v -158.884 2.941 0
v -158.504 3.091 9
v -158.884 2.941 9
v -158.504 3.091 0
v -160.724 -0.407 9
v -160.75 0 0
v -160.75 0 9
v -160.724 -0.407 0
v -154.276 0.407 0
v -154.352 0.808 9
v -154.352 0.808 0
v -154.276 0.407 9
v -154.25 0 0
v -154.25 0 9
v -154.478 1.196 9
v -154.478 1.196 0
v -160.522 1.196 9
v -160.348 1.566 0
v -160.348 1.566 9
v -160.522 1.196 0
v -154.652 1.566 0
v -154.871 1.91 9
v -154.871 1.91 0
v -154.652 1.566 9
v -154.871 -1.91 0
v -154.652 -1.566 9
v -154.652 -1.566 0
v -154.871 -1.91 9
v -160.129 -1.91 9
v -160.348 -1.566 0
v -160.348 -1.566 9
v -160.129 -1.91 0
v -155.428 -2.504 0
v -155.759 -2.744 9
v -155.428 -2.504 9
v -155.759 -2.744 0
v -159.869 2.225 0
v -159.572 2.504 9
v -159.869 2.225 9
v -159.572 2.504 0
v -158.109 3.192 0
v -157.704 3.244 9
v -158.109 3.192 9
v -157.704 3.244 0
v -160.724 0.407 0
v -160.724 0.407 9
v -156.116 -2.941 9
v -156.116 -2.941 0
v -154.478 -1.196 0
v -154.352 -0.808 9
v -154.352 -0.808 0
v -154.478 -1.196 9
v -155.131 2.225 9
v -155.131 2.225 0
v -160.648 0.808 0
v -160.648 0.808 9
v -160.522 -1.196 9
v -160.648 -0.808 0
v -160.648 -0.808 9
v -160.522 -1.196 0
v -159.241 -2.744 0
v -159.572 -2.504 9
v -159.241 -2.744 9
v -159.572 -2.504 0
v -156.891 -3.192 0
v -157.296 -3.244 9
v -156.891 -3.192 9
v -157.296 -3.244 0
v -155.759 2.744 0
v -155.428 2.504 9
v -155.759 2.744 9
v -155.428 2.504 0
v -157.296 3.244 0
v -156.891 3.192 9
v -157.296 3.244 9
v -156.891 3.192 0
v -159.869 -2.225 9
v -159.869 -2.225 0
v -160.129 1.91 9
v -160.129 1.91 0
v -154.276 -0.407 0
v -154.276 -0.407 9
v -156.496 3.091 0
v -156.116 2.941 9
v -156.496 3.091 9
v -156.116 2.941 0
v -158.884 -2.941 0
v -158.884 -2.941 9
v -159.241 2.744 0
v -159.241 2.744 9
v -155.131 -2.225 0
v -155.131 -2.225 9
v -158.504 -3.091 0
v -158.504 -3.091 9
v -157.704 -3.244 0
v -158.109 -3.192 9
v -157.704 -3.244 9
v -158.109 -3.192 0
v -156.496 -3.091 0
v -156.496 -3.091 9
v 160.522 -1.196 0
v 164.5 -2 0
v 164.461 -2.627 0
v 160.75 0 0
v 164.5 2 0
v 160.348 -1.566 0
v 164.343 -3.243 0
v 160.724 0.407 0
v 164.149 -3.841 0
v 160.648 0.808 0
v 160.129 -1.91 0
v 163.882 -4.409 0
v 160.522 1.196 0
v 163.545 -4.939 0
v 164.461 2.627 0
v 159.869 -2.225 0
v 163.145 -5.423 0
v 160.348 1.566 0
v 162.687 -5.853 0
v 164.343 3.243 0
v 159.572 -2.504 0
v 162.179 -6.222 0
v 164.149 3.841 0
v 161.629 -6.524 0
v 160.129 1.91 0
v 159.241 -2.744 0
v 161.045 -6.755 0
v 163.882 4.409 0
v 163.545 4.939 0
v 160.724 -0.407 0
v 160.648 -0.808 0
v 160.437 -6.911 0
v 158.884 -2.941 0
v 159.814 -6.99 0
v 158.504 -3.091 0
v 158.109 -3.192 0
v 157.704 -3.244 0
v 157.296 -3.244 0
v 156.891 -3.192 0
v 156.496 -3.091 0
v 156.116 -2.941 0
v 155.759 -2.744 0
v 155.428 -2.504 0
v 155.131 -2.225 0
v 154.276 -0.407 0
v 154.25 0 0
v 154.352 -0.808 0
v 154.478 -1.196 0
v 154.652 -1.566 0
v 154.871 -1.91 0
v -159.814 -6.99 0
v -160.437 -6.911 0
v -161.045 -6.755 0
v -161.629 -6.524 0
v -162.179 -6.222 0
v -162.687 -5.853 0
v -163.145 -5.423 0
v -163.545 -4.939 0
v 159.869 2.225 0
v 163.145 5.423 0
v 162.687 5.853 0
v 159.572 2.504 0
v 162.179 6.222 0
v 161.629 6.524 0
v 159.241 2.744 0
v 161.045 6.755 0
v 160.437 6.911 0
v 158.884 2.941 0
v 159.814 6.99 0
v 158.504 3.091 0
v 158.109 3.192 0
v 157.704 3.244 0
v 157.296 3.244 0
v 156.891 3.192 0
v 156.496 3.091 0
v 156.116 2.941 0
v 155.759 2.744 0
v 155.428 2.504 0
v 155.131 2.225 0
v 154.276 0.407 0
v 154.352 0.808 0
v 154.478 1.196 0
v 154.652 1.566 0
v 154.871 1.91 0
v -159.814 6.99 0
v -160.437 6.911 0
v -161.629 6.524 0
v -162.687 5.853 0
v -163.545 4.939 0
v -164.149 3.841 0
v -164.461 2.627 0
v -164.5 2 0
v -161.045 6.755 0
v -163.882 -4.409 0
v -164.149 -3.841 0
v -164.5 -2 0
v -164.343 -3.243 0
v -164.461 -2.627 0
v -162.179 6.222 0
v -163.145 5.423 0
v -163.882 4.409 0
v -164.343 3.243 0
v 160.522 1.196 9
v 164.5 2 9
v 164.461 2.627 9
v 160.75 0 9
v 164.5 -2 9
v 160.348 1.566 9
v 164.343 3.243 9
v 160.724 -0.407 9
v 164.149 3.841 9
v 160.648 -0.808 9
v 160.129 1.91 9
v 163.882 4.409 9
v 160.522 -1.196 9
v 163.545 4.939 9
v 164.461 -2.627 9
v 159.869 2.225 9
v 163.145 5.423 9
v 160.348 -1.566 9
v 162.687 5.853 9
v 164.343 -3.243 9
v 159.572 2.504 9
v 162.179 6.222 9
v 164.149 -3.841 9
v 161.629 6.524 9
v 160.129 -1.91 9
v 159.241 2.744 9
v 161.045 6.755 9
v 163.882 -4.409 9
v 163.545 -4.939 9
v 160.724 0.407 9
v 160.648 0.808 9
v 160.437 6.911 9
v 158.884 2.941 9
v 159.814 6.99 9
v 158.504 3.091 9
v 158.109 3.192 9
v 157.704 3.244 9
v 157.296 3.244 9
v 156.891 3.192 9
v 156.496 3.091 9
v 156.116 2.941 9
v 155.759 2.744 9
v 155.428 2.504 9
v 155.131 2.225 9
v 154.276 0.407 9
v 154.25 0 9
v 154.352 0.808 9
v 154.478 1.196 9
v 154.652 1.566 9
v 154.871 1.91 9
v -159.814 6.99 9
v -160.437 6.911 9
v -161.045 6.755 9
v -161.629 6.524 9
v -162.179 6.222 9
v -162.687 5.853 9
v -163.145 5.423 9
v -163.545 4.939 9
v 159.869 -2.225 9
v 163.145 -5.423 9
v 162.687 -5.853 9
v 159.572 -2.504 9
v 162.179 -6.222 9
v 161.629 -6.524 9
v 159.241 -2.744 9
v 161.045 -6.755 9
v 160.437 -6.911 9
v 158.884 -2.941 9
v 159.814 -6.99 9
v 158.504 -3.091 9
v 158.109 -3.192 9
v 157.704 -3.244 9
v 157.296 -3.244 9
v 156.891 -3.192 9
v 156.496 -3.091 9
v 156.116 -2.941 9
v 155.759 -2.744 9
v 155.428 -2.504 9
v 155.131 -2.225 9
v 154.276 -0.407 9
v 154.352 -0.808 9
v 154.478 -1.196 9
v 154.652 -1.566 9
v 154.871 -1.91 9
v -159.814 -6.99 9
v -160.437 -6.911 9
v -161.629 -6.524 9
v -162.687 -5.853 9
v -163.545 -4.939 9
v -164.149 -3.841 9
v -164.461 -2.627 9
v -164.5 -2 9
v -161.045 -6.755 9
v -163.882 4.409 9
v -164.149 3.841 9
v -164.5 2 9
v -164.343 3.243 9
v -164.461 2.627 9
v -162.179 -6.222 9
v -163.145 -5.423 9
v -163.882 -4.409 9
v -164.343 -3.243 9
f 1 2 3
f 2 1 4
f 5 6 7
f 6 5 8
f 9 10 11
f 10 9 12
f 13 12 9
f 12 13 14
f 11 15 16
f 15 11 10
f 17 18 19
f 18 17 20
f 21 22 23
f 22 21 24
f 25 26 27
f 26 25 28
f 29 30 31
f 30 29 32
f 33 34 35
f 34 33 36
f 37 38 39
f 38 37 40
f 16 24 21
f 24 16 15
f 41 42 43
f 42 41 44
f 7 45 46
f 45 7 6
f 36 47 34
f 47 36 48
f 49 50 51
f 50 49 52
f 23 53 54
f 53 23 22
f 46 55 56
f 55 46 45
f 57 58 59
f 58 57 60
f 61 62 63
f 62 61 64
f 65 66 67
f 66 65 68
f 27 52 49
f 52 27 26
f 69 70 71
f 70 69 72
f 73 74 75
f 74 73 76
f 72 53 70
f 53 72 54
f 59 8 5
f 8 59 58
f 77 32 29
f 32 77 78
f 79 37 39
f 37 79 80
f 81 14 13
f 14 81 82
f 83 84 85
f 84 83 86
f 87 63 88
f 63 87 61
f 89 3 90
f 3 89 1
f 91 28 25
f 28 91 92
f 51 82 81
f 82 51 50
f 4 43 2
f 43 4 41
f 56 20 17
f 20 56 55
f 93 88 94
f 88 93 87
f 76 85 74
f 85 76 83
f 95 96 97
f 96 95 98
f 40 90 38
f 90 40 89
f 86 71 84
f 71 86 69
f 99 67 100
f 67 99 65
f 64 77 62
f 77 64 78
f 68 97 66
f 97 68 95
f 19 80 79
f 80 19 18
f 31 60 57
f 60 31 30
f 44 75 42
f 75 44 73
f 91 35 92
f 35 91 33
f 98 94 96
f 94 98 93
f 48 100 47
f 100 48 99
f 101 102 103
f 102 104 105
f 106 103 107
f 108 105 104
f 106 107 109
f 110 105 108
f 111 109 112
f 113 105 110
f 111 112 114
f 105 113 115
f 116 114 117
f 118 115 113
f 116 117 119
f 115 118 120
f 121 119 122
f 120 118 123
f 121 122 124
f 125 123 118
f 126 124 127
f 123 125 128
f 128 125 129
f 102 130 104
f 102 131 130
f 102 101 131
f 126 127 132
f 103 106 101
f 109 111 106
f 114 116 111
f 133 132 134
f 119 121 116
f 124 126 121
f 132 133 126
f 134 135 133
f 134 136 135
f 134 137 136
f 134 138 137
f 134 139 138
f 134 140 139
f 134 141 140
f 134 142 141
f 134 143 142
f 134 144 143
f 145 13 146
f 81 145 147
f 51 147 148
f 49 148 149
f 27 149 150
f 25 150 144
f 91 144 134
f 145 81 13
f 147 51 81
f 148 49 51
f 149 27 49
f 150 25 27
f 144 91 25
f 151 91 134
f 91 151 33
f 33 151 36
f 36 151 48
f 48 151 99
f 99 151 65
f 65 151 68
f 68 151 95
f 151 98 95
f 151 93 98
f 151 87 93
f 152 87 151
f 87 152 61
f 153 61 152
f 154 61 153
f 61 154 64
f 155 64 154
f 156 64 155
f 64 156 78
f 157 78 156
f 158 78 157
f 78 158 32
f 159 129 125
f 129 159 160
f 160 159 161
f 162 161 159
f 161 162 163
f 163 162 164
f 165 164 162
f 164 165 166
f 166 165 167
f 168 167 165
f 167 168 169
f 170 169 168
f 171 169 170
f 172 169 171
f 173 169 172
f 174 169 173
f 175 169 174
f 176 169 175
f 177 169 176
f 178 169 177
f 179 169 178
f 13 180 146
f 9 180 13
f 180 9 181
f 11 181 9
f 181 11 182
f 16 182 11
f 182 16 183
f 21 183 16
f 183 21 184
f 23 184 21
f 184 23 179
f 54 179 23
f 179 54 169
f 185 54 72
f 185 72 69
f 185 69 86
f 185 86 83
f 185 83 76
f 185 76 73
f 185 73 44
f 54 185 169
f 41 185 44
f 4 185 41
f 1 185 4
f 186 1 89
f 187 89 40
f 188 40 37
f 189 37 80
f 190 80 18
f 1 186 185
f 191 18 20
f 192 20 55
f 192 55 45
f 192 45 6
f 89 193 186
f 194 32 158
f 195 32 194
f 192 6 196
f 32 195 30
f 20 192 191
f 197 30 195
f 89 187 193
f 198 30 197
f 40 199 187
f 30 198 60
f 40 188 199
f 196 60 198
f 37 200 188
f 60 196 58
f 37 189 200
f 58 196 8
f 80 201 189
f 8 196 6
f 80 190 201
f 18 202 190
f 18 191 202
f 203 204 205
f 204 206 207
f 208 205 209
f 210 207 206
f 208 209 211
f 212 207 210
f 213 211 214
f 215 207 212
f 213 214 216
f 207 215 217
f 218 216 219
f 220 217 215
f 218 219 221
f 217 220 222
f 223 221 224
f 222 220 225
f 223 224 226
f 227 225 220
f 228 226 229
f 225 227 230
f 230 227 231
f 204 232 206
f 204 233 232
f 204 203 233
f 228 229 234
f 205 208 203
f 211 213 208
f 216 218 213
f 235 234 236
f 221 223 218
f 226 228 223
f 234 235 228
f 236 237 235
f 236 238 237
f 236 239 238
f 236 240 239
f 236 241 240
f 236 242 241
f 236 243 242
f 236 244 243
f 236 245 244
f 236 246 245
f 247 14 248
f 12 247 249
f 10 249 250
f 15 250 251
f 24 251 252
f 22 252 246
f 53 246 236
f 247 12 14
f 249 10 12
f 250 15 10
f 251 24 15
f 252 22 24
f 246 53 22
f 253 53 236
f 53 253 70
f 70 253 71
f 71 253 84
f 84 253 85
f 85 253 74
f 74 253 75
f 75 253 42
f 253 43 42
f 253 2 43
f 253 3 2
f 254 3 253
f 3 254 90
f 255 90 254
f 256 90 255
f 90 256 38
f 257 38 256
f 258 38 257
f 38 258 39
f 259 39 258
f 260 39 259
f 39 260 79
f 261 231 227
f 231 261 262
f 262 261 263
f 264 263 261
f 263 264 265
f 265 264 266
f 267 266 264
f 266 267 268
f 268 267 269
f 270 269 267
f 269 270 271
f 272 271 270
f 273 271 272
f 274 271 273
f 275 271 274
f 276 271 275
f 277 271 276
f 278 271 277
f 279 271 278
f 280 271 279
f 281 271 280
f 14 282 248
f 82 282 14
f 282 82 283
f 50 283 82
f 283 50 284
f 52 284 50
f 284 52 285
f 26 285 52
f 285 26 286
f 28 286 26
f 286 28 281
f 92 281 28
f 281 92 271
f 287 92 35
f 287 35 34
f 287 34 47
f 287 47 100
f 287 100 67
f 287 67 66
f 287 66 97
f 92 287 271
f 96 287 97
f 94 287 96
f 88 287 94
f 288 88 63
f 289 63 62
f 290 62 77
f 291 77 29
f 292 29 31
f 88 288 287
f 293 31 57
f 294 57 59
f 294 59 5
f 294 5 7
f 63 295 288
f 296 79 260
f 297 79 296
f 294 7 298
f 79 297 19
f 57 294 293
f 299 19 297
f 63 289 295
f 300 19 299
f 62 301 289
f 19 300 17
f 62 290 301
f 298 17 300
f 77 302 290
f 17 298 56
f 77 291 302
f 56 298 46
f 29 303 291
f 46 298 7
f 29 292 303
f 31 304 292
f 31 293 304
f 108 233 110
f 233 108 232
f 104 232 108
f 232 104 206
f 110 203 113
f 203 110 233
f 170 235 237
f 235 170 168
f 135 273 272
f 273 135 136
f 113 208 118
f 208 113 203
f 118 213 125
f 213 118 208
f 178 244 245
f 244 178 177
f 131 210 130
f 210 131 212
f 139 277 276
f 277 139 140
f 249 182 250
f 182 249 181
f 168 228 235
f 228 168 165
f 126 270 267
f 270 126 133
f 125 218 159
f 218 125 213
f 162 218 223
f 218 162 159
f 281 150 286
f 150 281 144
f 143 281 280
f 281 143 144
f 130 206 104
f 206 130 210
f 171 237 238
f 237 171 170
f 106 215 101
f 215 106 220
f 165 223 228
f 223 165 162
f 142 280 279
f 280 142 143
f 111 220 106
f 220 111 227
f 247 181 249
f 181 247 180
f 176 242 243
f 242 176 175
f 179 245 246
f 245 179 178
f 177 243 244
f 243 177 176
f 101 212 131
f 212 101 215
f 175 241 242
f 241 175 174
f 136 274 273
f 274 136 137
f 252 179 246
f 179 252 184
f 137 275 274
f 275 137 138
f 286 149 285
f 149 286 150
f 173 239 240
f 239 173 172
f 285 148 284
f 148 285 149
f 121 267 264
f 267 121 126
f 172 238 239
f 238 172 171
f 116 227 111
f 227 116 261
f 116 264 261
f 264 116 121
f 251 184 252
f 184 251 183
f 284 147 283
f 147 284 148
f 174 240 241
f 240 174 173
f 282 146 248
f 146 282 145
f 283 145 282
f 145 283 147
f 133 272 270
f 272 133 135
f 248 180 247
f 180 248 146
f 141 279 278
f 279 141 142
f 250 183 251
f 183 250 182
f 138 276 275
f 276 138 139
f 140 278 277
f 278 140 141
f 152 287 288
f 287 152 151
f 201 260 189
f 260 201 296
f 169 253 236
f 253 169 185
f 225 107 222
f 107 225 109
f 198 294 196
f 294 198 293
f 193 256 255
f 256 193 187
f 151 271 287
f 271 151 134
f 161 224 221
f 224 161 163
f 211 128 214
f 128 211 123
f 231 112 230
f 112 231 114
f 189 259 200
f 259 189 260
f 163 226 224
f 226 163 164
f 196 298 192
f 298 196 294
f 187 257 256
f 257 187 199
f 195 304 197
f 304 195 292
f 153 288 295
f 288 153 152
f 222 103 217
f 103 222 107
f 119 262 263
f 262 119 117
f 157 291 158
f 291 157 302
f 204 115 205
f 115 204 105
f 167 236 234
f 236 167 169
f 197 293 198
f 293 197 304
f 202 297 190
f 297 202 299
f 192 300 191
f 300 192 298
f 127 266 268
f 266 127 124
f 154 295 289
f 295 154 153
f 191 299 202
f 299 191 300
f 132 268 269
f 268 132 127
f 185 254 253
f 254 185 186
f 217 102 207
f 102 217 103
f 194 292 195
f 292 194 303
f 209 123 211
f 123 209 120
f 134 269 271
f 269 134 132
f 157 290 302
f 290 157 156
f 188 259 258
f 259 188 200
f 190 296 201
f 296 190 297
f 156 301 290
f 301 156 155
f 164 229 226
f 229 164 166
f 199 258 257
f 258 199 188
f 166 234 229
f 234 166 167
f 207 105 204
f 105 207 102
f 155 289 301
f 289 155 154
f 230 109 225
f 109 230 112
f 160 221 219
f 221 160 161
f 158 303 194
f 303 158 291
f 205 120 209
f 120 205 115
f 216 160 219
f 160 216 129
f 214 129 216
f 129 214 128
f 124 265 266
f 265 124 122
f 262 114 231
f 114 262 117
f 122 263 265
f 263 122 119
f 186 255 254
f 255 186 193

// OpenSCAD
$fn = 50;


difference() {
	union() {
		hull() {
			translate(v = [-159.5000000000, 2.0000000000, 0]) {
				cylinder(h = 9, r = 5);
			}
			translate(v = [159.5000000000, 2.0000000000, 0]) {
				cylinder(h = 9, r = 5);
			}
			translate(v = [-159.5000000000, -2.0000000000, 0]) {
				cylinder(h = 9, r = 5);
			}
			translate(v = [159.5000000000, -2.0000000000, 0]) {
				cylinder(h = 9, r = 5);
			}
		}
	}
	union() {
		translate(v = [-157.5000000000, 0.0000000000, 0]) {
			cylinder(h = 9, r = 3.2500000000);
		}
		translate(v = [157.5000000000, 0.0000000000, 0]) {
			cylinder(h = 9, r = 3.2500000000);
		}
		translate(v = [-157.5000000000, 0.0000000000, 0]) {
			cylinder(h = 9, r = 1.8000000000);
		}
		translate(v = [157.5000000000, 0.0000000000, 0]) {
			cylinder(h = 9, r = 1.8000000000);
		}
		translate(v = [-157.5000000000, 0.0000000000, 0]) {
			cylinder(h = 9, r = 1.8000000000);
		}
		translate(v = [157.5000000000, 0.0000000000, 0]) {
			cylinder(h = 9, r = 1.8000000000);
		}
		translate(v = [-157.5000000000, 0.0000000000, 0]) {
			cylinder(h = 9, r = 1.8000000000);
		}
		translate(v = [157.5000000000, 0.0000000000, 0]) {
			cylinder(h = 9, r = 1.8000000000);
		}
	}
}
